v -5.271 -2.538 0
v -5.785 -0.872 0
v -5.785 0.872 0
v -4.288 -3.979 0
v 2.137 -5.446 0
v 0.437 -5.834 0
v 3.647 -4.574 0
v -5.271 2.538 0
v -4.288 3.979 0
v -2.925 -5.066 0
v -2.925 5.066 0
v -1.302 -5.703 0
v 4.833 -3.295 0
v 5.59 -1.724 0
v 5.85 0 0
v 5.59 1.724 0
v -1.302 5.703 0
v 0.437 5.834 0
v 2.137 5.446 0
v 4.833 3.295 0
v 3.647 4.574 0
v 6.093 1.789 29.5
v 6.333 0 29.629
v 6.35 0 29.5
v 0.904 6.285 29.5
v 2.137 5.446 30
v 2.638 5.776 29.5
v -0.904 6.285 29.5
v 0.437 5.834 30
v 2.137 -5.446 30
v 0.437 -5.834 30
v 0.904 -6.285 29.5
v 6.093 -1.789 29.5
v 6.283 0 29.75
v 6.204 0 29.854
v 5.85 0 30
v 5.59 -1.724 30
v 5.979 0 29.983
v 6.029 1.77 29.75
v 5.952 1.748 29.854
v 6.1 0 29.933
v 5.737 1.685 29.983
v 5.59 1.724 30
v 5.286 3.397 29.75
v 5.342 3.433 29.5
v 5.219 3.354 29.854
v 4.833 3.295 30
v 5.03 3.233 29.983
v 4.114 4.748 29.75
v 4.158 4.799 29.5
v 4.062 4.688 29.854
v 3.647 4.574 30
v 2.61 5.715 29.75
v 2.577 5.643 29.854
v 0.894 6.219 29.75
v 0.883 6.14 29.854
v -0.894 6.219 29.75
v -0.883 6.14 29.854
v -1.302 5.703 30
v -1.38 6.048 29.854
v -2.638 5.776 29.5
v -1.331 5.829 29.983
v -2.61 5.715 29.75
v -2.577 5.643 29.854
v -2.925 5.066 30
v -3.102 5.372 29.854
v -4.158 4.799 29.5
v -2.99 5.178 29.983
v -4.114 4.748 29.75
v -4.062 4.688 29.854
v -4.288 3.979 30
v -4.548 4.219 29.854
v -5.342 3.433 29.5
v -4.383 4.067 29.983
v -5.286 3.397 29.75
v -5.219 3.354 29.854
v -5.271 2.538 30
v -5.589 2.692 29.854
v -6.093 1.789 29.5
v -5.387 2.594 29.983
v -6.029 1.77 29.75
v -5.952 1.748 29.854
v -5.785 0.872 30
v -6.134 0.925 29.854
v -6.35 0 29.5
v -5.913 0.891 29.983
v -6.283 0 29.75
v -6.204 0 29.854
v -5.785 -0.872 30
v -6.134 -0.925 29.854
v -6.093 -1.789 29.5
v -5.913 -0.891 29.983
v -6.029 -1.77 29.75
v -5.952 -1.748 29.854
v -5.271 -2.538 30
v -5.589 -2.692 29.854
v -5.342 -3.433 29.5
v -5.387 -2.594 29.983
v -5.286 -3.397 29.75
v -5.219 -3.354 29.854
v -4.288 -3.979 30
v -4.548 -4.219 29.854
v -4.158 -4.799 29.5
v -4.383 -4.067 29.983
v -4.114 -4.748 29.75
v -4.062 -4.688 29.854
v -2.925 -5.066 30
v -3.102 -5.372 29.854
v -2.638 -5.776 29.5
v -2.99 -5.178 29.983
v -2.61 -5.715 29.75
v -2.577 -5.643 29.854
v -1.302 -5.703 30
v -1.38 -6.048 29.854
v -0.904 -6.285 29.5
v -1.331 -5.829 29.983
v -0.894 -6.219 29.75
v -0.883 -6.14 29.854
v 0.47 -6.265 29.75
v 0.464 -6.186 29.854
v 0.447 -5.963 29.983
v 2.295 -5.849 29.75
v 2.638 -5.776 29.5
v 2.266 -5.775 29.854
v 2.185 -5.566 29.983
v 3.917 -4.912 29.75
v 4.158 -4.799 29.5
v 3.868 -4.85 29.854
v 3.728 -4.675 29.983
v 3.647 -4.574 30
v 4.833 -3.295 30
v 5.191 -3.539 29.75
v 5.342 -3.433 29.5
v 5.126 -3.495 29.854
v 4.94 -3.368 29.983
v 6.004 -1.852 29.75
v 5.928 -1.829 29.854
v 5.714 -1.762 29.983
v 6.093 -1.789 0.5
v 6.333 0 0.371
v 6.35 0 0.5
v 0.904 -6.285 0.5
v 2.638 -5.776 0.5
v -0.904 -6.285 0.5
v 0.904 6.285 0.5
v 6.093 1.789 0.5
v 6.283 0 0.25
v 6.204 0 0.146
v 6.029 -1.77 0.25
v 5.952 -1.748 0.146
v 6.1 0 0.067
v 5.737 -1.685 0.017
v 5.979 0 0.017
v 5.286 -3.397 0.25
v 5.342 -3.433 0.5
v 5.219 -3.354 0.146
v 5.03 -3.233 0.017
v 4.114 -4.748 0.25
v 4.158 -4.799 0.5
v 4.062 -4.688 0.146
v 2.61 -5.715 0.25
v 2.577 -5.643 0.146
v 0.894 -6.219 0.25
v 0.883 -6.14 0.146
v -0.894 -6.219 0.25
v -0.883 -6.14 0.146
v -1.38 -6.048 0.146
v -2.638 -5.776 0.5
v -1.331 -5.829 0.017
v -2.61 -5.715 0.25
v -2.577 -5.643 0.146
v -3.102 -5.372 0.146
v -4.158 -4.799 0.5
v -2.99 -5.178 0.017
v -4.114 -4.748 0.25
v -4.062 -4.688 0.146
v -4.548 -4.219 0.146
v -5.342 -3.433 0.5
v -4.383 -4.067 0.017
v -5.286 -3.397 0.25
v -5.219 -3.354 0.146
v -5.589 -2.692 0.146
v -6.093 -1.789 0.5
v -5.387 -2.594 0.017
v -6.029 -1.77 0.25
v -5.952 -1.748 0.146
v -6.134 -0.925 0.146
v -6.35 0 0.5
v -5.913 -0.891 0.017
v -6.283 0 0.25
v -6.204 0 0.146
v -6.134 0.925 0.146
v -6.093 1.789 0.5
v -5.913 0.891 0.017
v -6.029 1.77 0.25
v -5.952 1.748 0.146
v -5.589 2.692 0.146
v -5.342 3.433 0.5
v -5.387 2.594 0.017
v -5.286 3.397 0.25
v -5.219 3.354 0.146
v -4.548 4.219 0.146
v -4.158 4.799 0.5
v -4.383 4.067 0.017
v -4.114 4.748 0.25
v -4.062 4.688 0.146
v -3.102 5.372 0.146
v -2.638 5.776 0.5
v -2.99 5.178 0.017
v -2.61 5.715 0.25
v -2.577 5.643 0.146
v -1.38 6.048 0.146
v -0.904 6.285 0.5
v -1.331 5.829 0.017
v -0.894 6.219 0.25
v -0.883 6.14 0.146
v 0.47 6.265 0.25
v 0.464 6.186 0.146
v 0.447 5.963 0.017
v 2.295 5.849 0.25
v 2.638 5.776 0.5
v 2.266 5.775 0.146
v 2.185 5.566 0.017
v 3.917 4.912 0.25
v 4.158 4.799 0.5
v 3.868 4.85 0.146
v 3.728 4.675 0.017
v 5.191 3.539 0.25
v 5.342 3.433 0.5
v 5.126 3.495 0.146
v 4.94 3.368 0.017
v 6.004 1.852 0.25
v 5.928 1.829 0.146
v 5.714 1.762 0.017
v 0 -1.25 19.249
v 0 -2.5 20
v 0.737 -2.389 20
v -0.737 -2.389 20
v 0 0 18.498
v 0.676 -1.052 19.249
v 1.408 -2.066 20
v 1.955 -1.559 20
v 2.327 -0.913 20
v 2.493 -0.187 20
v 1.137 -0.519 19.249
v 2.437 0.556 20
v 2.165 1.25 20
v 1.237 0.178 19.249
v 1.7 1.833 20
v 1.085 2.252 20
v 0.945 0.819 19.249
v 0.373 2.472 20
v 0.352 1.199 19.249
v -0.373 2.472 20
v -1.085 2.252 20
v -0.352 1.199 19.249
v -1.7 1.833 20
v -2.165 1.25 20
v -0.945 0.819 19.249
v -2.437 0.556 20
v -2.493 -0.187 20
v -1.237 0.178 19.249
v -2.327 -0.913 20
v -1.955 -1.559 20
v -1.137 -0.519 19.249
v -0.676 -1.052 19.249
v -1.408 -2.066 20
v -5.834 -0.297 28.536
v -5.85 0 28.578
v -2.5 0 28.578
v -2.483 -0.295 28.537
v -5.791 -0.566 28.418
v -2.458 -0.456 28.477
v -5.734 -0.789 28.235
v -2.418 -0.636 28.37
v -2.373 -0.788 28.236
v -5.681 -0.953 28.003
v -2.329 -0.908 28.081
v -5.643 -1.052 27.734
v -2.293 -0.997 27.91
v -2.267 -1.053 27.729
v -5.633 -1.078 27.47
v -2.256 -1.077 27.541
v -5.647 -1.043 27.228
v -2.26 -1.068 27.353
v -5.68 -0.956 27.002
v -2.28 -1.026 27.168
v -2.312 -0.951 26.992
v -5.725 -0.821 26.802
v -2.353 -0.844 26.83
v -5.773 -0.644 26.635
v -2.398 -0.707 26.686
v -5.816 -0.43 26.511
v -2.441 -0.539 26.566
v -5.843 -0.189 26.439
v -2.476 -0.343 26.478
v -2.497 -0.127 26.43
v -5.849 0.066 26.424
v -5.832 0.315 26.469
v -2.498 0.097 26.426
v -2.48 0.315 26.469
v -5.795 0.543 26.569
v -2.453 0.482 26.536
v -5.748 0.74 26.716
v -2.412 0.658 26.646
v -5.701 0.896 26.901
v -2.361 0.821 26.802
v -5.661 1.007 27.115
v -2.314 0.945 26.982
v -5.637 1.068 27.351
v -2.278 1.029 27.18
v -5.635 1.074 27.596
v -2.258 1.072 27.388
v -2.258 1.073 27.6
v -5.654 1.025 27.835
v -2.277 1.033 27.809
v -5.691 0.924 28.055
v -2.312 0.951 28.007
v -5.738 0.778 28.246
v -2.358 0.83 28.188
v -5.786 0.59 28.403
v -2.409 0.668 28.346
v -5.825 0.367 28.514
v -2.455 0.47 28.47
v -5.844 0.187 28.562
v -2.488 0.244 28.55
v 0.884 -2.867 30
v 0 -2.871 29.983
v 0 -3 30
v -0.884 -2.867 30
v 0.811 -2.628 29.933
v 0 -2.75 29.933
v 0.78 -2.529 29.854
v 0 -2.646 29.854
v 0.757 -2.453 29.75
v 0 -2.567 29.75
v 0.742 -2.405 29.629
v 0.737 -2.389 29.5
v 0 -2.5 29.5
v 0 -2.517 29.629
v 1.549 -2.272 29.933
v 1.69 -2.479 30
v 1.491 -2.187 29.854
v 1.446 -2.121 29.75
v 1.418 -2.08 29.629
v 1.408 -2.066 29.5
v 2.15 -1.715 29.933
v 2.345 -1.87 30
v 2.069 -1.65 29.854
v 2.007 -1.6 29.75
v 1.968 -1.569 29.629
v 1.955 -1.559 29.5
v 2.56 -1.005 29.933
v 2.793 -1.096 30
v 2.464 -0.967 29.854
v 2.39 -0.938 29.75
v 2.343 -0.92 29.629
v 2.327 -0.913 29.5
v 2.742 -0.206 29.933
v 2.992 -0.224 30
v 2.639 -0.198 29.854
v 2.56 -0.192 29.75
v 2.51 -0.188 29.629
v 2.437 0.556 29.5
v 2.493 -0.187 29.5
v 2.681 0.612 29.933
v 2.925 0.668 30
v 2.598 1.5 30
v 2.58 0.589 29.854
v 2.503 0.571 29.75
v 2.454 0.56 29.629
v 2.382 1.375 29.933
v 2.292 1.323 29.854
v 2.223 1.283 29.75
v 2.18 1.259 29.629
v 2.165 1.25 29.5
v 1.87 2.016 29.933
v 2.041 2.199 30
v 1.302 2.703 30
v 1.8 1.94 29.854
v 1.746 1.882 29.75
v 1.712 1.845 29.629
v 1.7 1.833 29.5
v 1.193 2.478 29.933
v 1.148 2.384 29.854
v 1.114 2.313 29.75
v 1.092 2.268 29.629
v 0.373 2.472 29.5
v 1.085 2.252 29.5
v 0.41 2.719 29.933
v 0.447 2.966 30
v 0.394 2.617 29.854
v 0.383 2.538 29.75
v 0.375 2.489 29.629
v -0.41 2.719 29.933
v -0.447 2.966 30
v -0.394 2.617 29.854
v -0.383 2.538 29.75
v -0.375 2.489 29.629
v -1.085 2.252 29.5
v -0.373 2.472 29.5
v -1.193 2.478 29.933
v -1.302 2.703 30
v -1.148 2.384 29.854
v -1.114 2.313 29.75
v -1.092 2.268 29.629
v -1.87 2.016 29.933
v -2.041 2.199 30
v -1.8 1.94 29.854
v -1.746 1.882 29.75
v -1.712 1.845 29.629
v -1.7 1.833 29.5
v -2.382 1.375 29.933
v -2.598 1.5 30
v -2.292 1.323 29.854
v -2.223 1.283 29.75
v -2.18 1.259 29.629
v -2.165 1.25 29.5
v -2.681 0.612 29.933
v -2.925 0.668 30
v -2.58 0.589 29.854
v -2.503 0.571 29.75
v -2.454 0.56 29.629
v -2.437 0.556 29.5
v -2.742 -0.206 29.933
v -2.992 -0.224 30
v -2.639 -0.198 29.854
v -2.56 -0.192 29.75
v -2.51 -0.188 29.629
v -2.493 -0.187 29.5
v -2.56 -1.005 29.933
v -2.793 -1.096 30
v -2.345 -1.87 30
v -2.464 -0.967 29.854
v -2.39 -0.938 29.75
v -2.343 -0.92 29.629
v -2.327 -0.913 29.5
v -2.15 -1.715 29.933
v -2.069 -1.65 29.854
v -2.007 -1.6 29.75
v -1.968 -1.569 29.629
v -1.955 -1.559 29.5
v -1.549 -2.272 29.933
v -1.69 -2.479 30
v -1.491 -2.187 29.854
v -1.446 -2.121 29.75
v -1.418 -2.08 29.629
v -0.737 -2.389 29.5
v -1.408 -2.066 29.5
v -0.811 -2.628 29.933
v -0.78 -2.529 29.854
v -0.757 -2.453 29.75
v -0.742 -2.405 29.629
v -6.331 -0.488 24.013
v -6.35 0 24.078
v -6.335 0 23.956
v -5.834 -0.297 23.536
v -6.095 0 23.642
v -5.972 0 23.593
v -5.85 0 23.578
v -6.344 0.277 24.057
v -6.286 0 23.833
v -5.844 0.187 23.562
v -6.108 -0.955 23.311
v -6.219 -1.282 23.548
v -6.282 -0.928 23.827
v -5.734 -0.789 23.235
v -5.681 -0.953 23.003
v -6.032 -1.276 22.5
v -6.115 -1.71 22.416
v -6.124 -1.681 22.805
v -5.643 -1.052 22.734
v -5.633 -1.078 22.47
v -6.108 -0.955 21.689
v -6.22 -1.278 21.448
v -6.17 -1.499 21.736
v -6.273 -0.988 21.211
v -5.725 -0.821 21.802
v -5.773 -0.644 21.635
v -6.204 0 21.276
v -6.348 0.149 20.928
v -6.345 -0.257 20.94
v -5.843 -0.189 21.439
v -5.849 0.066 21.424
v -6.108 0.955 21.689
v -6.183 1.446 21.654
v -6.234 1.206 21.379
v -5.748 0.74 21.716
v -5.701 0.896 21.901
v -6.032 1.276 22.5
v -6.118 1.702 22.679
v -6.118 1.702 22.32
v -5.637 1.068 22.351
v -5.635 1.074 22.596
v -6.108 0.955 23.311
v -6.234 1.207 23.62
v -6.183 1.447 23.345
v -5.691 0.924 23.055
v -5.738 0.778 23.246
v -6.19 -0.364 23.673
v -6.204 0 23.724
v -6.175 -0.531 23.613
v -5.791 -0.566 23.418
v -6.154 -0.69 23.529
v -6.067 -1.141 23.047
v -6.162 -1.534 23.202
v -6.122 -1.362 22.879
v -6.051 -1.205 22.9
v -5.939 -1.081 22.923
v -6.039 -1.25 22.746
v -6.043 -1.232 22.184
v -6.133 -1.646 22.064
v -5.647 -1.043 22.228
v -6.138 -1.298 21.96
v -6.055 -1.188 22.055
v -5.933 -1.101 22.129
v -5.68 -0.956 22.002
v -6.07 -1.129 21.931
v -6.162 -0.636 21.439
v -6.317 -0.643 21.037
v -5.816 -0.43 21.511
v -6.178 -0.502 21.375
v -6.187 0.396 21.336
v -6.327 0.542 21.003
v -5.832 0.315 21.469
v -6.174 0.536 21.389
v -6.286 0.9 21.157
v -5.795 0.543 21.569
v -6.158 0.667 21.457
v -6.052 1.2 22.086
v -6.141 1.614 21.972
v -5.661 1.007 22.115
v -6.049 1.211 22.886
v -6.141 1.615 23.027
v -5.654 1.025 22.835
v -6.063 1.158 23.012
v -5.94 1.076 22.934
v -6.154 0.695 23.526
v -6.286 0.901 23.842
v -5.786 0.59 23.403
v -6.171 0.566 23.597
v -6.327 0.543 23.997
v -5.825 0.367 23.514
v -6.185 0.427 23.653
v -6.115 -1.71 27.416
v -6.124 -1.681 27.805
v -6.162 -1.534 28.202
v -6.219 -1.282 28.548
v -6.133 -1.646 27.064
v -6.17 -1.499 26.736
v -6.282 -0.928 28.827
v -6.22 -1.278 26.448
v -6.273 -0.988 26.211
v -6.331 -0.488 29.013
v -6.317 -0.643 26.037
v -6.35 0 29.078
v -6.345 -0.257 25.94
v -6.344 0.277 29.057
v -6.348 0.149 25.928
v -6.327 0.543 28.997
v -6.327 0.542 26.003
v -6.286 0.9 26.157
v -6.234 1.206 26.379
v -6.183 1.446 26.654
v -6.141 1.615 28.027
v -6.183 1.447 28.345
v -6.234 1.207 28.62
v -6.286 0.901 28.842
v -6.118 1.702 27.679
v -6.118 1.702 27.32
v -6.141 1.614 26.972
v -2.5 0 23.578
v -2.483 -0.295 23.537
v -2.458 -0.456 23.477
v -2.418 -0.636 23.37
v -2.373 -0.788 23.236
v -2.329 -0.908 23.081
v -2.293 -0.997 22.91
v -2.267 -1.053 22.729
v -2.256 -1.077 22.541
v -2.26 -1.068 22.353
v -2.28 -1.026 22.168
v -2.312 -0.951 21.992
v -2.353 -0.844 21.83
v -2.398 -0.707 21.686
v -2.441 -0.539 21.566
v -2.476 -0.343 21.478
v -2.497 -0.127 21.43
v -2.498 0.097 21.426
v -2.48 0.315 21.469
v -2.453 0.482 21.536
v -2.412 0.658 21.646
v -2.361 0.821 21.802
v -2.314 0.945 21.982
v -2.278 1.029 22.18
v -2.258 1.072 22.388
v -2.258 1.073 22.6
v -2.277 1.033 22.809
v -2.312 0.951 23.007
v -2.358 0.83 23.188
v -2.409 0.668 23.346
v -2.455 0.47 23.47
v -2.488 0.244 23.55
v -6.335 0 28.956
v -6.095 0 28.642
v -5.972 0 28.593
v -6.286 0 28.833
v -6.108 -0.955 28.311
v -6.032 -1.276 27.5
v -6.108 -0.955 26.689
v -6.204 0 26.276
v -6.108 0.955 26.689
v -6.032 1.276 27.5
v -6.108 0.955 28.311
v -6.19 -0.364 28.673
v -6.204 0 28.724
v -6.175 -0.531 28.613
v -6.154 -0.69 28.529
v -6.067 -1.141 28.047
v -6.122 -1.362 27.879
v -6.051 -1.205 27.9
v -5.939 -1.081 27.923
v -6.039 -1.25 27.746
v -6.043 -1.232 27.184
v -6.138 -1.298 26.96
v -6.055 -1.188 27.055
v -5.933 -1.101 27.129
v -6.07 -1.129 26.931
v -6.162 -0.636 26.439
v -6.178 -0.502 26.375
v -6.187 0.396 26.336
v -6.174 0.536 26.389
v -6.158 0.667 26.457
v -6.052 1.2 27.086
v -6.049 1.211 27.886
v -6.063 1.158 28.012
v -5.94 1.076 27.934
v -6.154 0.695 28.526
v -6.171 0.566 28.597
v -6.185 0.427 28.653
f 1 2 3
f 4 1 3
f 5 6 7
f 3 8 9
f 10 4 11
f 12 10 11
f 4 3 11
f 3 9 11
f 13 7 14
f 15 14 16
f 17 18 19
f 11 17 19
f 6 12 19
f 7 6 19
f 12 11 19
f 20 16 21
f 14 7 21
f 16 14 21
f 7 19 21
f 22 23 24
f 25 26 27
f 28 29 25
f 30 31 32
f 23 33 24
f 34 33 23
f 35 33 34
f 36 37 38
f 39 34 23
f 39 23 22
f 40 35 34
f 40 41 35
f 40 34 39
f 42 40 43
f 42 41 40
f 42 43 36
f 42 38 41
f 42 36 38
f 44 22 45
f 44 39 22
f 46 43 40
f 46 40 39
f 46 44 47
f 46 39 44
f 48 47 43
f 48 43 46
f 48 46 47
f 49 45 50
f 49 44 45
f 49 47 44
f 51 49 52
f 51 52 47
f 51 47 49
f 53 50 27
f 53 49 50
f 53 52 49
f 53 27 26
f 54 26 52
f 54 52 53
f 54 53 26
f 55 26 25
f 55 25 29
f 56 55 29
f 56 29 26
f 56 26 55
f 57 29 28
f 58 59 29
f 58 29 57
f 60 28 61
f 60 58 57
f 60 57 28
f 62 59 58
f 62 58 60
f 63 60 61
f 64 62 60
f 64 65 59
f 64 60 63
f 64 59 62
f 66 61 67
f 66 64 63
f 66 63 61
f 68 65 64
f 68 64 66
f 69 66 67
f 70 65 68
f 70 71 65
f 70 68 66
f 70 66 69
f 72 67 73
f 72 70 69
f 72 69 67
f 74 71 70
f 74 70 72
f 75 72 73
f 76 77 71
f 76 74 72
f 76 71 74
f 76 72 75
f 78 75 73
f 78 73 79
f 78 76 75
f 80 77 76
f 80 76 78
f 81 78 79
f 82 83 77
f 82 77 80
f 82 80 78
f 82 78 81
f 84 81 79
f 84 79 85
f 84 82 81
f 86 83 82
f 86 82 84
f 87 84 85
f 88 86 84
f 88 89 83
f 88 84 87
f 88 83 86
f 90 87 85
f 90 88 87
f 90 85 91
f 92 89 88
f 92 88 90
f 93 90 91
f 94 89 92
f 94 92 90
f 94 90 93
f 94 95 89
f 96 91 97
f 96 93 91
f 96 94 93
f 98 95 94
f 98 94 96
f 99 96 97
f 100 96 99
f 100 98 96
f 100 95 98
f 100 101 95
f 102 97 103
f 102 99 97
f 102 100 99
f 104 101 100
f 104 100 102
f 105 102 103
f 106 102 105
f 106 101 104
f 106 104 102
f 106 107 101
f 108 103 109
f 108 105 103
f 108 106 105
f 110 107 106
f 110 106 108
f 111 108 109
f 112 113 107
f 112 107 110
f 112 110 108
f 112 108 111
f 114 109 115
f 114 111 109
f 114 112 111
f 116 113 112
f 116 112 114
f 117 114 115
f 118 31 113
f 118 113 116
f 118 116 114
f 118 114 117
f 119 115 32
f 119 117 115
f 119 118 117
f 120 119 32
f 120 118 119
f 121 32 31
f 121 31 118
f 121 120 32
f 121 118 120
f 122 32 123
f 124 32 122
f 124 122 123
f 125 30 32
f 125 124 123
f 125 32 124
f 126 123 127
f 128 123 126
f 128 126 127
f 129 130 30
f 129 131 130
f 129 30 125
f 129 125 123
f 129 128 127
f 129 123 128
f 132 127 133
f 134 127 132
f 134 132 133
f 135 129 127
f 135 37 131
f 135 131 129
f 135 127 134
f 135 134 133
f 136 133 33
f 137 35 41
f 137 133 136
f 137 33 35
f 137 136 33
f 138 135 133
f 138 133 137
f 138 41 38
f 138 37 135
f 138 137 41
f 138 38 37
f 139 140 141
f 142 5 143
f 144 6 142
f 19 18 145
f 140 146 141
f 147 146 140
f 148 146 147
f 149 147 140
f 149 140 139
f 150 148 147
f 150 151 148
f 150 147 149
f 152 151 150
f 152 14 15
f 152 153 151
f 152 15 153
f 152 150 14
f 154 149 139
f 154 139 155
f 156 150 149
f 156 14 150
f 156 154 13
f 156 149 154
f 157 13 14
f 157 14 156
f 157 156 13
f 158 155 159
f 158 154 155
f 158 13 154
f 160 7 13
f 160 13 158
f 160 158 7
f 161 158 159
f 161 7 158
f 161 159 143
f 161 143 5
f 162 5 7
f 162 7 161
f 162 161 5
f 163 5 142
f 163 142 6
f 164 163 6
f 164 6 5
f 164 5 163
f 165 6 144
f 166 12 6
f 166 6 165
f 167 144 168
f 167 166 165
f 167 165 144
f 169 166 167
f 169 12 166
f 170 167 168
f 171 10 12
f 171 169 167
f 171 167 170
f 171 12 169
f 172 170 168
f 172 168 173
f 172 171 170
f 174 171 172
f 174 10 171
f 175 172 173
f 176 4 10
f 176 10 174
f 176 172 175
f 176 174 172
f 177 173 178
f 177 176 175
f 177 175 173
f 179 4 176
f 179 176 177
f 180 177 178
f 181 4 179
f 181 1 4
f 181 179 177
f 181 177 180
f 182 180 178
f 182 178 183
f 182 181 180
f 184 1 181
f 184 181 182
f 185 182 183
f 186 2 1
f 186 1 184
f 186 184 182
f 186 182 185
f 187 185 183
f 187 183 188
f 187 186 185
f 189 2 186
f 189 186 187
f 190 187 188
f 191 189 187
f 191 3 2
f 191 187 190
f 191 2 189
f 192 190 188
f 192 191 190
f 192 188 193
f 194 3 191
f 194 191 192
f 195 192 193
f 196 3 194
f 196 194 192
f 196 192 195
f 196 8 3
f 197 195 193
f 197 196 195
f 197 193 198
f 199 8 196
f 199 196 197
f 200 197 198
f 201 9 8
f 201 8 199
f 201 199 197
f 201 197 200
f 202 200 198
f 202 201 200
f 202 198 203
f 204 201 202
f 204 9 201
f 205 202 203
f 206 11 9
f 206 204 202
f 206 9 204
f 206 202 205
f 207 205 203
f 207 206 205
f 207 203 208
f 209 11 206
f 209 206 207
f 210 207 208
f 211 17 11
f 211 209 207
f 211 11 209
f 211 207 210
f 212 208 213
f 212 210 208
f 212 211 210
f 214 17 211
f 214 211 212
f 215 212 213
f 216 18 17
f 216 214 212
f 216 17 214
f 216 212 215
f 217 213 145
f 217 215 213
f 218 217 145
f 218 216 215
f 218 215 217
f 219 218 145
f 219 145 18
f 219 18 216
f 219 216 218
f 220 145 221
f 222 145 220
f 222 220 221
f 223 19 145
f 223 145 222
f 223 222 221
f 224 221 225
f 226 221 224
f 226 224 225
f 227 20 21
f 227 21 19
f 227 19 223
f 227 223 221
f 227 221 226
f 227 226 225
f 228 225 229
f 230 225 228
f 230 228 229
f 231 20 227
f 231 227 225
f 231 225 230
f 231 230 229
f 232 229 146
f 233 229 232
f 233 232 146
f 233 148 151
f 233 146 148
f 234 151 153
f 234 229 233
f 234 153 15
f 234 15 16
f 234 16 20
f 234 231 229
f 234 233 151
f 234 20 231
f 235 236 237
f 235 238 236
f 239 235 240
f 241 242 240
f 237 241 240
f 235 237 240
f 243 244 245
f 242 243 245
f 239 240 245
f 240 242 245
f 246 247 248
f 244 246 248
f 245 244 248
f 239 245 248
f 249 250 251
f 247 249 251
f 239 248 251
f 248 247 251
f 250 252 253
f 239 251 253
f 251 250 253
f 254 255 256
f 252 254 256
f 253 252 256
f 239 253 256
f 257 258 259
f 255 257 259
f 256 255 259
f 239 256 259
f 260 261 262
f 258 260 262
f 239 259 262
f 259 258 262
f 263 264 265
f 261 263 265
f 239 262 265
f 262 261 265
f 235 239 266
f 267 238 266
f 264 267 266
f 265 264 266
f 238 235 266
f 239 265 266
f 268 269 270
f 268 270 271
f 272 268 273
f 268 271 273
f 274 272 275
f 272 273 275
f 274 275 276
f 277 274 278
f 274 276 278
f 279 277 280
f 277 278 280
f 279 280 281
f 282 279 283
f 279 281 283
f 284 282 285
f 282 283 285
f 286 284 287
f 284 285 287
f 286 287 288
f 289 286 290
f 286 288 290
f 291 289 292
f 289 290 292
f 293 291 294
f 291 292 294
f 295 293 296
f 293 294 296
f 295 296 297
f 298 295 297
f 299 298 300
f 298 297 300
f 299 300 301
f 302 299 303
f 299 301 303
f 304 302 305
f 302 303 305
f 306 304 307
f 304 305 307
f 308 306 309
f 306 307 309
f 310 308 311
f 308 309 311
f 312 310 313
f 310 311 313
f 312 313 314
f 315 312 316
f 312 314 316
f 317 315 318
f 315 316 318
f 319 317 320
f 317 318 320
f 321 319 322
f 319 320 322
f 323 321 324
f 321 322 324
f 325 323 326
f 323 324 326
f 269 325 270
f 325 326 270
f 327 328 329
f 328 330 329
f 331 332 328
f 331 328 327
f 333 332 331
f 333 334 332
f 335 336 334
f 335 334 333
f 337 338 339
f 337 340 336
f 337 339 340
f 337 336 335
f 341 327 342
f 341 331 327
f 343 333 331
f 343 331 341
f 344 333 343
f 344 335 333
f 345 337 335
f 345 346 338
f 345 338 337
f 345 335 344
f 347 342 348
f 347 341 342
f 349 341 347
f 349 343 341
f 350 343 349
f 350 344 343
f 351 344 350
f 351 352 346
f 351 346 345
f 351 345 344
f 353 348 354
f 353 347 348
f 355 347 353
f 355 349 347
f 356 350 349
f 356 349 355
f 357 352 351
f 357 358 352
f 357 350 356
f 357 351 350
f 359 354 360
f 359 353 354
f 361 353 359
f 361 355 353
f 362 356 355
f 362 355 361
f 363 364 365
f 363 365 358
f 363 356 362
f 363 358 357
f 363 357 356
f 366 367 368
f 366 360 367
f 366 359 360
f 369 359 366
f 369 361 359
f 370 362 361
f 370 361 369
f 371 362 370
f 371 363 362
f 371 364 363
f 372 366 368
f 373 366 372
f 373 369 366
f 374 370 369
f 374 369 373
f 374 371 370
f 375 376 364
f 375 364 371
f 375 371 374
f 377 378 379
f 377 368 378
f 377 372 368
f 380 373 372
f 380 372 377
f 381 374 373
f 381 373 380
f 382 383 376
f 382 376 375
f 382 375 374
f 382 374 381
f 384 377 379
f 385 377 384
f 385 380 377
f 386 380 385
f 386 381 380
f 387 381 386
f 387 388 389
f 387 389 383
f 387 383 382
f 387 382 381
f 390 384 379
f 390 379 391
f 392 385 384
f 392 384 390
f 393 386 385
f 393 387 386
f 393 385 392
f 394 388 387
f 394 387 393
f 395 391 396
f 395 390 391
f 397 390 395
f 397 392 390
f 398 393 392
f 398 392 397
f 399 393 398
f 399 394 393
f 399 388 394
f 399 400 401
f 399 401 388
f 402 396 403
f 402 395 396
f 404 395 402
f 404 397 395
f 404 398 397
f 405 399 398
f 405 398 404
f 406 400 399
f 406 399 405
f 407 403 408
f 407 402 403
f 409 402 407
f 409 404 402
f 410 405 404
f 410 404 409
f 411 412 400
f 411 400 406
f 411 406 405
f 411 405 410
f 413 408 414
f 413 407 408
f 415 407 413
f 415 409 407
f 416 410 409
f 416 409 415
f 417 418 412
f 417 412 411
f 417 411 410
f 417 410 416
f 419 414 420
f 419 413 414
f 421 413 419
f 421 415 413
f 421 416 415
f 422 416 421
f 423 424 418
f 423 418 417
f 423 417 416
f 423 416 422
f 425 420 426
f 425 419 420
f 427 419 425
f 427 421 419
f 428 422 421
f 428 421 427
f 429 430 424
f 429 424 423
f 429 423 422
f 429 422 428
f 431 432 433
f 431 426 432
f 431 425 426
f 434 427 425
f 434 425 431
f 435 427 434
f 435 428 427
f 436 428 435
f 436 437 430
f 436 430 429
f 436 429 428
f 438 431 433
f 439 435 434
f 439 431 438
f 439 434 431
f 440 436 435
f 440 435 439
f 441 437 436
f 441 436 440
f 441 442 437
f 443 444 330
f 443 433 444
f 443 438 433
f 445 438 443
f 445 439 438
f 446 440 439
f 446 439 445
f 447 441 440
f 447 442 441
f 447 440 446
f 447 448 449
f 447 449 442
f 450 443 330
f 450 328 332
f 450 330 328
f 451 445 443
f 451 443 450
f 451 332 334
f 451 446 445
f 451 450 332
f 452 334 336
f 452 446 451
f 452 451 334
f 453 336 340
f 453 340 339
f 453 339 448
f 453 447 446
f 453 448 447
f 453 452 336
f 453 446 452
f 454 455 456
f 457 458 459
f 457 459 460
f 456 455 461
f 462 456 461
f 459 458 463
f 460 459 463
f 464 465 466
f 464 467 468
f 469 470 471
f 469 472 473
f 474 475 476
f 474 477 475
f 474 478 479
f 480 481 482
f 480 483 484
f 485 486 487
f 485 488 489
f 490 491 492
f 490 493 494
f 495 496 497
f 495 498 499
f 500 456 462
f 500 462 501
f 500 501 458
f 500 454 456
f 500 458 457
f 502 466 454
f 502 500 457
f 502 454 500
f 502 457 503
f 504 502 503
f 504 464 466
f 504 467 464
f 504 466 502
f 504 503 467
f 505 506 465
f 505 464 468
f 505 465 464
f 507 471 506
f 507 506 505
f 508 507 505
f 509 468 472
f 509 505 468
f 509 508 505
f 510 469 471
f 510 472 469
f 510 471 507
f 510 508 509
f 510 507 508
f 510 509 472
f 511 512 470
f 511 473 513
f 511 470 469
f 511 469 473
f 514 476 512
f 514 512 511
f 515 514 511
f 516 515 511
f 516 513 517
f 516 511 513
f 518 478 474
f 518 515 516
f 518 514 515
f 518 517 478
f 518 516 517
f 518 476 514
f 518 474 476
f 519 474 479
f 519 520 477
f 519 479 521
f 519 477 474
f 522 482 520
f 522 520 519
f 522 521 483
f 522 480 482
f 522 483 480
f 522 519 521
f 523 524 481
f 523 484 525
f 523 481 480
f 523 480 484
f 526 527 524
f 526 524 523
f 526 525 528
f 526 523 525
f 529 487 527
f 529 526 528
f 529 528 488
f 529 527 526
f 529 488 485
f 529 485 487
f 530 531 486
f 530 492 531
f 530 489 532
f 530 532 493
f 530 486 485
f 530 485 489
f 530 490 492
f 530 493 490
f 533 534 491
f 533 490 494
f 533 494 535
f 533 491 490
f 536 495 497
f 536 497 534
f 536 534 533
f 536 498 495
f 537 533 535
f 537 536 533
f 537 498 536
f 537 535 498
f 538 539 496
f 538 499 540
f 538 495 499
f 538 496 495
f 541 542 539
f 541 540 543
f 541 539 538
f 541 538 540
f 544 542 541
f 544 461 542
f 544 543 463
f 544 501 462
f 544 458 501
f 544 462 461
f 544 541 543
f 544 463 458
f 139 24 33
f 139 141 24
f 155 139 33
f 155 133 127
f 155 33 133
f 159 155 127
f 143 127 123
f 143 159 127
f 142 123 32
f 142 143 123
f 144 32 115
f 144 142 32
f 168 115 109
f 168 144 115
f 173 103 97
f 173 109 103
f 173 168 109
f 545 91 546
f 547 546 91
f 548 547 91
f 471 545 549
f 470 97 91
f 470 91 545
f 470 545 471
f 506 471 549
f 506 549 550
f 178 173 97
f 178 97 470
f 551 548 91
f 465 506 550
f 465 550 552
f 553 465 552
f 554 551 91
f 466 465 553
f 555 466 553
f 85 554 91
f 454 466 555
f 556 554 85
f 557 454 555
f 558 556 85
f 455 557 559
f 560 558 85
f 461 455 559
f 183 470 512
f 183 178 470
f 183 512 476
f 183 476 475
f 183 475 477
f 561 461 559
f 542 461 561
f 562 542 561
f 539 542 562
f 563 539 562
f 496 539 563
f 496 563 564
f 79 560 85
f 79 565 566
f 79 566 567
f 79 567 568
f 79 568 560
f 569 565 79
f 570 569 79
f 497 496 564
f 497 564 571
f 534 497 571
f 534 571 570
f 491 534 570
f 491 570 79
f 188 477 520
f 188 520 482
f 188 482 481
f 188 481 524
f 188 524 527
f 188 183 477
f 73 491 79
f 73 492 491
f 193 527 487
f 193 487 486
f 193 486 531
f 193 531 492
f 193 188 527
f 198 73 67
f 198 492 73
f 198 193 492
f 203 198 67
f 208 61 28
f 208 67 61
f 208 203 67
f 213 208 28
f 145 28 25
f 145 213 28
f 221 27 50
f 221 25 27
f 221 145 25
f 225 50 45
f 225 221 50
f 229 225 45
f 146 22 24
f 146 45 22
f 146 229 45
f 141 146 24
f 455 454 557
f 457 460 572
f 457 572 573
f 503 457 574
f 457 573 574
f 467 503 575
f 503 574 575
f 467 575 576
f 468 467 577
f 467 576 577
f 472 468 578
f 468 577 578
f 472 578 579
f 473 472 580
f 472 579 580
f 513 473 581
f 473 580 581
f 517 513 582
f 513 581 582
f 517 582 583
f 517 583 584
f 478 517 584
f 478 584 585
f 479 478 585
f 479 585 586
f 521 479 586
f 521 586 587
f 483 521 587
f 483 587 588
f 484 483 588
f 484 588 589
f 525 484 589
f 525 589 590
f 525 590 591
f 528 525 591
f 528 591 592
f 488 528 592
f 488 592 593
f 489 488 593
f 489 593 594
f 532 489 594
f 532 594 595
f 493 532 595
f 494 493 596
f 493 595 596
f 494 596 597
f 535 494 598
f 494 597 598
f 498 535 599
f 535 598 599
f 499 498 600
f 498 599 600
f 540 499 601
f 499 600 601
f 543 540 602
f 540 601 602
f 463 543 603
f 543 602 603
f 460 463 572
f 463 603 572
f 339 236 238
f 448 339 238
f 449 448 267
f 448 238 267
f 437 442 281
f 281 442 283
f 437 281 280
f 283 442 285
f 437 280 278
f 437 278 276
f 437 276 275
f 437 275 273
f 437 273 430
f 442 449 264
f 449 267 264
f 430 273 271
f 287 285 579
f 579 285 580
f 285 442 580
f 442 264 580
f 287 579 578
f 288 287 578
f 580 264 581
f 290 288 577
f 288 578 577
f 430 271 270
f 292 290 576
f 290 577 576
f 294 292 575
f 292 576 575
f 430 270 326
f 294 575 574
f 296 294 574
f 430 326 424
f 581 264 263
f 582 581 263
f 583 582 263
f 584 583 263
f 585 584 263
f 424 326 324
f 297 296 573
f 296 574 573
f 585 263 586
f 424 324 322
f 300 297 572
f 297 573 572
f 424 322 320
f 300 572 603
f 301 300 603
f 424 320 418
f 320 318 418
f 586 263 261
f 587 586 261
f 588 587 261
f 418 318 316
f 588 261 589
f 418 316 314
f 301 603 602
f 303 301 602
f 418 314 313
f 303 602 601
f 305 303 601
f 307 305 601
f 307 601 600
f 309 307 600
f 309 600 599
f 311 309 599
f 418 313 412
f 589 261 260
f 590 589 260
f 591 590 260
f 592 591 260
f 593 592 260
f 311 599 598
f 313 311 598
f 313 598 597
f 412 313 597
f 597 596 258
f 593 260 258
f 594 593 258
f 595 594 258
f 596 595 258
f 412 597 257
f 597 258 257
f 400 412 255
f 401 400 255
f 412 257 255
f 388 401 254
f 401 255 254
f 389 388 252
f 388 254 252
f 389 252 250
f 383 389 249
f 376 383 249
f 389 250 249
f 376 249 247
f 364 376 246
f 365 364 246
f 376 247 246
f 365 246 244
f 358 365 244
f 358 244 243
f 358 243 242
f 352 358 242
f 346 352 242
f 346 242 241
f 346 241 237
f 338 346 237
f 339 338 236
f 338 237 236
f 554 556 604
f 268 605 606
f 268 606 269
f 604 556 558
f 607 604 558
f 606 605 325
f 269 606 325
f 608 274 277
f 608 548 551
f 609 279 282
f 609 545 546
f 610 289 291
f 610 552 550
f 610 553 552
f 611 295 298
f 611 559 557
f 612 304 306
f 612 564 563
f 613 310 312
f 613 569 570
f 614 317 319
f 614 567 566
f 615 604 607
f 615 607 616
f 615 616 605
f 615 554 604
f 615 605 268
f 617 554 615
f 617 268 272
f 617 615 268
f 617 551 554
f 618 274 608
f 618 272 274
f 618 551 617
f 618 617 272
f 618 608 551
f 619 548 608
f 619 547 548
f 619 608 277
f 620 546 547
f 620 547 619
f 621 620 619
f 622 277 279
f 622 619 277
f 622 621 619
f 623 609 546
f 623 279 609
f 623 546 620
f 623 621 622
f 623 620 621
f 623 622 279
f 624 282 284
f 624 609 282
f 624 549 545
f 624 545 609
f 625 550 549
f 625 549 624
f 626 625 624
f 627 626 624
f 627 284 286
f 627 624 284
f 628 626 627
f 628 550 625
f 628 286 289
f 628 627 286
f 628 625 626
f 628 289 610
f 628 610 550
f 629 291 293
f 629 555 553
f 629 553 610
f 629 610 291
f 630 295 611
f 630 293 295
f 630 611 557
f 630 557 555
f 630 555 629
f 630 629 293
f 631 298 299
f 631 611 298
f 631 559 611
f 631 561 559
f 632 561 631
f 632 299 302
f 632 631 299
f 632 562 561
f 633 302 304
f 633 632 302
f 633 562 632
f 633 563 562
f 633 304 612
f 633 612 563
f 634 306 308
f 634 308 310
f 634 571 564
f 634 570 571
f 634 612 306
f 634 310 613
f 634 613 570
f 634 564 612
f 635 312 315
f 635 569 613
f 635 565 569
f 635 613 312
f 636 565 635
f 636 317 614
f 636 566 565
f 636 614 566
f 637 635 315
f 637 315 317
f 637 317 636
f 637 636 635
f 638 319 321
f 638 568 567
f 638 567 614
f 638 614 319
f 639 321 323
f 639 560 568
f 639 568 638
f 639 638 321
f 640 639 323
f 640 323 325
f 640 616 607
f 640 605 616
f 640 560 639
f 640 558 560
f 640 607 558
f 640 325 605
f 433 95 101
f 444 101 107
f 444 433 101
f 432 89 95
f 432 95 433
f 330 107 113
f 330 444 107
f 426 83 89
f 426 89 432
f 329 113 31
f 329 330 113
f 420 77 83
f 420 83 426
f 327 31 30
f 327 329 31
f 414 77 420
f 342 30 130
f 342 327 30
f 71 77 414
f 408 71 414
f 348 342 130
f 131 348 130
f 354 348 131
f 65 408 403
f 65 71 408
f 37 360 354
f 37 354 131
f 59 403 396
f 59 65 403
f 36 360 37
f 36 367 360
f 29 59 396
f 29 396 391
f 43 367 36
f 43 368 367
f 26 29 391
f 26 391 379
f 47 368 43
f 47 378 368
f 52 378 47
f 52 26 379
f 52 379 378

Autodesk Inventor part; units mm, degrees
ref_plane "XZ Plane" through (0, 0, 0) normal (0, 1, 0) x (-1, 0, 0)
ref_plane "XY Plane" through (0, 0, 0) normal (0, 0, 1) x (1, 0, 0)
sketch "Sketch1" plane through (0, 0, 0) normal (0, 0, 1) x (1, 0, 0)
  circle A0 centre (0, 0) radius 6.35
  dimension "d0" = 12.7
extrude "Extrusion1" add sketch "Sketch1" along normal blind 30
hole "Hole1" at (0, 0, 30) direction (0, 0, -1) diameter 5 depth 10 tip angle 118
fillet "Fillet1" radius 0.5 3 edges at (0, 2.5, 30) (-6.35, 0, 30) (-6.35, 0, 0)
ref_plane "Work Plane1" through (-6.35, 0, 0) normal (1, 0, 0) x (0, 1, 0)
sketch "Sketch2" plane through (-6.35, 0, 0) normal (1, 0, 0) x (0, 1, 0)
  line L0 (0, 50.0021) -> (0, 0) construction
  line L1 (-5.85, 30) -> (5.85, 30) construction
  point P0 (0, 27.5)
  point P1 (0, 22.5)
  dimension "d23" = 2.5
  dimension "d24" = 5
hole "Hole3" at (-6.35, 0, 27.5) at (-6.35, 0, 22.5) direction (1, 0, 0) diameter 2.156 end up to surface thread size "4-40 UNC" class "2B" standard "ANSI Unified Screw Threads"
fillet "Fillet2" radius 0.5 4 edges at (-6.2578, 1.078, 27.4975) (-6.2578, -1.078, 27.4972) (-6.2578, 1.078, 22.4975) (-6.2578, -1.078, 22.4972)
properties part number "Roller" material "Nylon-6/6"
